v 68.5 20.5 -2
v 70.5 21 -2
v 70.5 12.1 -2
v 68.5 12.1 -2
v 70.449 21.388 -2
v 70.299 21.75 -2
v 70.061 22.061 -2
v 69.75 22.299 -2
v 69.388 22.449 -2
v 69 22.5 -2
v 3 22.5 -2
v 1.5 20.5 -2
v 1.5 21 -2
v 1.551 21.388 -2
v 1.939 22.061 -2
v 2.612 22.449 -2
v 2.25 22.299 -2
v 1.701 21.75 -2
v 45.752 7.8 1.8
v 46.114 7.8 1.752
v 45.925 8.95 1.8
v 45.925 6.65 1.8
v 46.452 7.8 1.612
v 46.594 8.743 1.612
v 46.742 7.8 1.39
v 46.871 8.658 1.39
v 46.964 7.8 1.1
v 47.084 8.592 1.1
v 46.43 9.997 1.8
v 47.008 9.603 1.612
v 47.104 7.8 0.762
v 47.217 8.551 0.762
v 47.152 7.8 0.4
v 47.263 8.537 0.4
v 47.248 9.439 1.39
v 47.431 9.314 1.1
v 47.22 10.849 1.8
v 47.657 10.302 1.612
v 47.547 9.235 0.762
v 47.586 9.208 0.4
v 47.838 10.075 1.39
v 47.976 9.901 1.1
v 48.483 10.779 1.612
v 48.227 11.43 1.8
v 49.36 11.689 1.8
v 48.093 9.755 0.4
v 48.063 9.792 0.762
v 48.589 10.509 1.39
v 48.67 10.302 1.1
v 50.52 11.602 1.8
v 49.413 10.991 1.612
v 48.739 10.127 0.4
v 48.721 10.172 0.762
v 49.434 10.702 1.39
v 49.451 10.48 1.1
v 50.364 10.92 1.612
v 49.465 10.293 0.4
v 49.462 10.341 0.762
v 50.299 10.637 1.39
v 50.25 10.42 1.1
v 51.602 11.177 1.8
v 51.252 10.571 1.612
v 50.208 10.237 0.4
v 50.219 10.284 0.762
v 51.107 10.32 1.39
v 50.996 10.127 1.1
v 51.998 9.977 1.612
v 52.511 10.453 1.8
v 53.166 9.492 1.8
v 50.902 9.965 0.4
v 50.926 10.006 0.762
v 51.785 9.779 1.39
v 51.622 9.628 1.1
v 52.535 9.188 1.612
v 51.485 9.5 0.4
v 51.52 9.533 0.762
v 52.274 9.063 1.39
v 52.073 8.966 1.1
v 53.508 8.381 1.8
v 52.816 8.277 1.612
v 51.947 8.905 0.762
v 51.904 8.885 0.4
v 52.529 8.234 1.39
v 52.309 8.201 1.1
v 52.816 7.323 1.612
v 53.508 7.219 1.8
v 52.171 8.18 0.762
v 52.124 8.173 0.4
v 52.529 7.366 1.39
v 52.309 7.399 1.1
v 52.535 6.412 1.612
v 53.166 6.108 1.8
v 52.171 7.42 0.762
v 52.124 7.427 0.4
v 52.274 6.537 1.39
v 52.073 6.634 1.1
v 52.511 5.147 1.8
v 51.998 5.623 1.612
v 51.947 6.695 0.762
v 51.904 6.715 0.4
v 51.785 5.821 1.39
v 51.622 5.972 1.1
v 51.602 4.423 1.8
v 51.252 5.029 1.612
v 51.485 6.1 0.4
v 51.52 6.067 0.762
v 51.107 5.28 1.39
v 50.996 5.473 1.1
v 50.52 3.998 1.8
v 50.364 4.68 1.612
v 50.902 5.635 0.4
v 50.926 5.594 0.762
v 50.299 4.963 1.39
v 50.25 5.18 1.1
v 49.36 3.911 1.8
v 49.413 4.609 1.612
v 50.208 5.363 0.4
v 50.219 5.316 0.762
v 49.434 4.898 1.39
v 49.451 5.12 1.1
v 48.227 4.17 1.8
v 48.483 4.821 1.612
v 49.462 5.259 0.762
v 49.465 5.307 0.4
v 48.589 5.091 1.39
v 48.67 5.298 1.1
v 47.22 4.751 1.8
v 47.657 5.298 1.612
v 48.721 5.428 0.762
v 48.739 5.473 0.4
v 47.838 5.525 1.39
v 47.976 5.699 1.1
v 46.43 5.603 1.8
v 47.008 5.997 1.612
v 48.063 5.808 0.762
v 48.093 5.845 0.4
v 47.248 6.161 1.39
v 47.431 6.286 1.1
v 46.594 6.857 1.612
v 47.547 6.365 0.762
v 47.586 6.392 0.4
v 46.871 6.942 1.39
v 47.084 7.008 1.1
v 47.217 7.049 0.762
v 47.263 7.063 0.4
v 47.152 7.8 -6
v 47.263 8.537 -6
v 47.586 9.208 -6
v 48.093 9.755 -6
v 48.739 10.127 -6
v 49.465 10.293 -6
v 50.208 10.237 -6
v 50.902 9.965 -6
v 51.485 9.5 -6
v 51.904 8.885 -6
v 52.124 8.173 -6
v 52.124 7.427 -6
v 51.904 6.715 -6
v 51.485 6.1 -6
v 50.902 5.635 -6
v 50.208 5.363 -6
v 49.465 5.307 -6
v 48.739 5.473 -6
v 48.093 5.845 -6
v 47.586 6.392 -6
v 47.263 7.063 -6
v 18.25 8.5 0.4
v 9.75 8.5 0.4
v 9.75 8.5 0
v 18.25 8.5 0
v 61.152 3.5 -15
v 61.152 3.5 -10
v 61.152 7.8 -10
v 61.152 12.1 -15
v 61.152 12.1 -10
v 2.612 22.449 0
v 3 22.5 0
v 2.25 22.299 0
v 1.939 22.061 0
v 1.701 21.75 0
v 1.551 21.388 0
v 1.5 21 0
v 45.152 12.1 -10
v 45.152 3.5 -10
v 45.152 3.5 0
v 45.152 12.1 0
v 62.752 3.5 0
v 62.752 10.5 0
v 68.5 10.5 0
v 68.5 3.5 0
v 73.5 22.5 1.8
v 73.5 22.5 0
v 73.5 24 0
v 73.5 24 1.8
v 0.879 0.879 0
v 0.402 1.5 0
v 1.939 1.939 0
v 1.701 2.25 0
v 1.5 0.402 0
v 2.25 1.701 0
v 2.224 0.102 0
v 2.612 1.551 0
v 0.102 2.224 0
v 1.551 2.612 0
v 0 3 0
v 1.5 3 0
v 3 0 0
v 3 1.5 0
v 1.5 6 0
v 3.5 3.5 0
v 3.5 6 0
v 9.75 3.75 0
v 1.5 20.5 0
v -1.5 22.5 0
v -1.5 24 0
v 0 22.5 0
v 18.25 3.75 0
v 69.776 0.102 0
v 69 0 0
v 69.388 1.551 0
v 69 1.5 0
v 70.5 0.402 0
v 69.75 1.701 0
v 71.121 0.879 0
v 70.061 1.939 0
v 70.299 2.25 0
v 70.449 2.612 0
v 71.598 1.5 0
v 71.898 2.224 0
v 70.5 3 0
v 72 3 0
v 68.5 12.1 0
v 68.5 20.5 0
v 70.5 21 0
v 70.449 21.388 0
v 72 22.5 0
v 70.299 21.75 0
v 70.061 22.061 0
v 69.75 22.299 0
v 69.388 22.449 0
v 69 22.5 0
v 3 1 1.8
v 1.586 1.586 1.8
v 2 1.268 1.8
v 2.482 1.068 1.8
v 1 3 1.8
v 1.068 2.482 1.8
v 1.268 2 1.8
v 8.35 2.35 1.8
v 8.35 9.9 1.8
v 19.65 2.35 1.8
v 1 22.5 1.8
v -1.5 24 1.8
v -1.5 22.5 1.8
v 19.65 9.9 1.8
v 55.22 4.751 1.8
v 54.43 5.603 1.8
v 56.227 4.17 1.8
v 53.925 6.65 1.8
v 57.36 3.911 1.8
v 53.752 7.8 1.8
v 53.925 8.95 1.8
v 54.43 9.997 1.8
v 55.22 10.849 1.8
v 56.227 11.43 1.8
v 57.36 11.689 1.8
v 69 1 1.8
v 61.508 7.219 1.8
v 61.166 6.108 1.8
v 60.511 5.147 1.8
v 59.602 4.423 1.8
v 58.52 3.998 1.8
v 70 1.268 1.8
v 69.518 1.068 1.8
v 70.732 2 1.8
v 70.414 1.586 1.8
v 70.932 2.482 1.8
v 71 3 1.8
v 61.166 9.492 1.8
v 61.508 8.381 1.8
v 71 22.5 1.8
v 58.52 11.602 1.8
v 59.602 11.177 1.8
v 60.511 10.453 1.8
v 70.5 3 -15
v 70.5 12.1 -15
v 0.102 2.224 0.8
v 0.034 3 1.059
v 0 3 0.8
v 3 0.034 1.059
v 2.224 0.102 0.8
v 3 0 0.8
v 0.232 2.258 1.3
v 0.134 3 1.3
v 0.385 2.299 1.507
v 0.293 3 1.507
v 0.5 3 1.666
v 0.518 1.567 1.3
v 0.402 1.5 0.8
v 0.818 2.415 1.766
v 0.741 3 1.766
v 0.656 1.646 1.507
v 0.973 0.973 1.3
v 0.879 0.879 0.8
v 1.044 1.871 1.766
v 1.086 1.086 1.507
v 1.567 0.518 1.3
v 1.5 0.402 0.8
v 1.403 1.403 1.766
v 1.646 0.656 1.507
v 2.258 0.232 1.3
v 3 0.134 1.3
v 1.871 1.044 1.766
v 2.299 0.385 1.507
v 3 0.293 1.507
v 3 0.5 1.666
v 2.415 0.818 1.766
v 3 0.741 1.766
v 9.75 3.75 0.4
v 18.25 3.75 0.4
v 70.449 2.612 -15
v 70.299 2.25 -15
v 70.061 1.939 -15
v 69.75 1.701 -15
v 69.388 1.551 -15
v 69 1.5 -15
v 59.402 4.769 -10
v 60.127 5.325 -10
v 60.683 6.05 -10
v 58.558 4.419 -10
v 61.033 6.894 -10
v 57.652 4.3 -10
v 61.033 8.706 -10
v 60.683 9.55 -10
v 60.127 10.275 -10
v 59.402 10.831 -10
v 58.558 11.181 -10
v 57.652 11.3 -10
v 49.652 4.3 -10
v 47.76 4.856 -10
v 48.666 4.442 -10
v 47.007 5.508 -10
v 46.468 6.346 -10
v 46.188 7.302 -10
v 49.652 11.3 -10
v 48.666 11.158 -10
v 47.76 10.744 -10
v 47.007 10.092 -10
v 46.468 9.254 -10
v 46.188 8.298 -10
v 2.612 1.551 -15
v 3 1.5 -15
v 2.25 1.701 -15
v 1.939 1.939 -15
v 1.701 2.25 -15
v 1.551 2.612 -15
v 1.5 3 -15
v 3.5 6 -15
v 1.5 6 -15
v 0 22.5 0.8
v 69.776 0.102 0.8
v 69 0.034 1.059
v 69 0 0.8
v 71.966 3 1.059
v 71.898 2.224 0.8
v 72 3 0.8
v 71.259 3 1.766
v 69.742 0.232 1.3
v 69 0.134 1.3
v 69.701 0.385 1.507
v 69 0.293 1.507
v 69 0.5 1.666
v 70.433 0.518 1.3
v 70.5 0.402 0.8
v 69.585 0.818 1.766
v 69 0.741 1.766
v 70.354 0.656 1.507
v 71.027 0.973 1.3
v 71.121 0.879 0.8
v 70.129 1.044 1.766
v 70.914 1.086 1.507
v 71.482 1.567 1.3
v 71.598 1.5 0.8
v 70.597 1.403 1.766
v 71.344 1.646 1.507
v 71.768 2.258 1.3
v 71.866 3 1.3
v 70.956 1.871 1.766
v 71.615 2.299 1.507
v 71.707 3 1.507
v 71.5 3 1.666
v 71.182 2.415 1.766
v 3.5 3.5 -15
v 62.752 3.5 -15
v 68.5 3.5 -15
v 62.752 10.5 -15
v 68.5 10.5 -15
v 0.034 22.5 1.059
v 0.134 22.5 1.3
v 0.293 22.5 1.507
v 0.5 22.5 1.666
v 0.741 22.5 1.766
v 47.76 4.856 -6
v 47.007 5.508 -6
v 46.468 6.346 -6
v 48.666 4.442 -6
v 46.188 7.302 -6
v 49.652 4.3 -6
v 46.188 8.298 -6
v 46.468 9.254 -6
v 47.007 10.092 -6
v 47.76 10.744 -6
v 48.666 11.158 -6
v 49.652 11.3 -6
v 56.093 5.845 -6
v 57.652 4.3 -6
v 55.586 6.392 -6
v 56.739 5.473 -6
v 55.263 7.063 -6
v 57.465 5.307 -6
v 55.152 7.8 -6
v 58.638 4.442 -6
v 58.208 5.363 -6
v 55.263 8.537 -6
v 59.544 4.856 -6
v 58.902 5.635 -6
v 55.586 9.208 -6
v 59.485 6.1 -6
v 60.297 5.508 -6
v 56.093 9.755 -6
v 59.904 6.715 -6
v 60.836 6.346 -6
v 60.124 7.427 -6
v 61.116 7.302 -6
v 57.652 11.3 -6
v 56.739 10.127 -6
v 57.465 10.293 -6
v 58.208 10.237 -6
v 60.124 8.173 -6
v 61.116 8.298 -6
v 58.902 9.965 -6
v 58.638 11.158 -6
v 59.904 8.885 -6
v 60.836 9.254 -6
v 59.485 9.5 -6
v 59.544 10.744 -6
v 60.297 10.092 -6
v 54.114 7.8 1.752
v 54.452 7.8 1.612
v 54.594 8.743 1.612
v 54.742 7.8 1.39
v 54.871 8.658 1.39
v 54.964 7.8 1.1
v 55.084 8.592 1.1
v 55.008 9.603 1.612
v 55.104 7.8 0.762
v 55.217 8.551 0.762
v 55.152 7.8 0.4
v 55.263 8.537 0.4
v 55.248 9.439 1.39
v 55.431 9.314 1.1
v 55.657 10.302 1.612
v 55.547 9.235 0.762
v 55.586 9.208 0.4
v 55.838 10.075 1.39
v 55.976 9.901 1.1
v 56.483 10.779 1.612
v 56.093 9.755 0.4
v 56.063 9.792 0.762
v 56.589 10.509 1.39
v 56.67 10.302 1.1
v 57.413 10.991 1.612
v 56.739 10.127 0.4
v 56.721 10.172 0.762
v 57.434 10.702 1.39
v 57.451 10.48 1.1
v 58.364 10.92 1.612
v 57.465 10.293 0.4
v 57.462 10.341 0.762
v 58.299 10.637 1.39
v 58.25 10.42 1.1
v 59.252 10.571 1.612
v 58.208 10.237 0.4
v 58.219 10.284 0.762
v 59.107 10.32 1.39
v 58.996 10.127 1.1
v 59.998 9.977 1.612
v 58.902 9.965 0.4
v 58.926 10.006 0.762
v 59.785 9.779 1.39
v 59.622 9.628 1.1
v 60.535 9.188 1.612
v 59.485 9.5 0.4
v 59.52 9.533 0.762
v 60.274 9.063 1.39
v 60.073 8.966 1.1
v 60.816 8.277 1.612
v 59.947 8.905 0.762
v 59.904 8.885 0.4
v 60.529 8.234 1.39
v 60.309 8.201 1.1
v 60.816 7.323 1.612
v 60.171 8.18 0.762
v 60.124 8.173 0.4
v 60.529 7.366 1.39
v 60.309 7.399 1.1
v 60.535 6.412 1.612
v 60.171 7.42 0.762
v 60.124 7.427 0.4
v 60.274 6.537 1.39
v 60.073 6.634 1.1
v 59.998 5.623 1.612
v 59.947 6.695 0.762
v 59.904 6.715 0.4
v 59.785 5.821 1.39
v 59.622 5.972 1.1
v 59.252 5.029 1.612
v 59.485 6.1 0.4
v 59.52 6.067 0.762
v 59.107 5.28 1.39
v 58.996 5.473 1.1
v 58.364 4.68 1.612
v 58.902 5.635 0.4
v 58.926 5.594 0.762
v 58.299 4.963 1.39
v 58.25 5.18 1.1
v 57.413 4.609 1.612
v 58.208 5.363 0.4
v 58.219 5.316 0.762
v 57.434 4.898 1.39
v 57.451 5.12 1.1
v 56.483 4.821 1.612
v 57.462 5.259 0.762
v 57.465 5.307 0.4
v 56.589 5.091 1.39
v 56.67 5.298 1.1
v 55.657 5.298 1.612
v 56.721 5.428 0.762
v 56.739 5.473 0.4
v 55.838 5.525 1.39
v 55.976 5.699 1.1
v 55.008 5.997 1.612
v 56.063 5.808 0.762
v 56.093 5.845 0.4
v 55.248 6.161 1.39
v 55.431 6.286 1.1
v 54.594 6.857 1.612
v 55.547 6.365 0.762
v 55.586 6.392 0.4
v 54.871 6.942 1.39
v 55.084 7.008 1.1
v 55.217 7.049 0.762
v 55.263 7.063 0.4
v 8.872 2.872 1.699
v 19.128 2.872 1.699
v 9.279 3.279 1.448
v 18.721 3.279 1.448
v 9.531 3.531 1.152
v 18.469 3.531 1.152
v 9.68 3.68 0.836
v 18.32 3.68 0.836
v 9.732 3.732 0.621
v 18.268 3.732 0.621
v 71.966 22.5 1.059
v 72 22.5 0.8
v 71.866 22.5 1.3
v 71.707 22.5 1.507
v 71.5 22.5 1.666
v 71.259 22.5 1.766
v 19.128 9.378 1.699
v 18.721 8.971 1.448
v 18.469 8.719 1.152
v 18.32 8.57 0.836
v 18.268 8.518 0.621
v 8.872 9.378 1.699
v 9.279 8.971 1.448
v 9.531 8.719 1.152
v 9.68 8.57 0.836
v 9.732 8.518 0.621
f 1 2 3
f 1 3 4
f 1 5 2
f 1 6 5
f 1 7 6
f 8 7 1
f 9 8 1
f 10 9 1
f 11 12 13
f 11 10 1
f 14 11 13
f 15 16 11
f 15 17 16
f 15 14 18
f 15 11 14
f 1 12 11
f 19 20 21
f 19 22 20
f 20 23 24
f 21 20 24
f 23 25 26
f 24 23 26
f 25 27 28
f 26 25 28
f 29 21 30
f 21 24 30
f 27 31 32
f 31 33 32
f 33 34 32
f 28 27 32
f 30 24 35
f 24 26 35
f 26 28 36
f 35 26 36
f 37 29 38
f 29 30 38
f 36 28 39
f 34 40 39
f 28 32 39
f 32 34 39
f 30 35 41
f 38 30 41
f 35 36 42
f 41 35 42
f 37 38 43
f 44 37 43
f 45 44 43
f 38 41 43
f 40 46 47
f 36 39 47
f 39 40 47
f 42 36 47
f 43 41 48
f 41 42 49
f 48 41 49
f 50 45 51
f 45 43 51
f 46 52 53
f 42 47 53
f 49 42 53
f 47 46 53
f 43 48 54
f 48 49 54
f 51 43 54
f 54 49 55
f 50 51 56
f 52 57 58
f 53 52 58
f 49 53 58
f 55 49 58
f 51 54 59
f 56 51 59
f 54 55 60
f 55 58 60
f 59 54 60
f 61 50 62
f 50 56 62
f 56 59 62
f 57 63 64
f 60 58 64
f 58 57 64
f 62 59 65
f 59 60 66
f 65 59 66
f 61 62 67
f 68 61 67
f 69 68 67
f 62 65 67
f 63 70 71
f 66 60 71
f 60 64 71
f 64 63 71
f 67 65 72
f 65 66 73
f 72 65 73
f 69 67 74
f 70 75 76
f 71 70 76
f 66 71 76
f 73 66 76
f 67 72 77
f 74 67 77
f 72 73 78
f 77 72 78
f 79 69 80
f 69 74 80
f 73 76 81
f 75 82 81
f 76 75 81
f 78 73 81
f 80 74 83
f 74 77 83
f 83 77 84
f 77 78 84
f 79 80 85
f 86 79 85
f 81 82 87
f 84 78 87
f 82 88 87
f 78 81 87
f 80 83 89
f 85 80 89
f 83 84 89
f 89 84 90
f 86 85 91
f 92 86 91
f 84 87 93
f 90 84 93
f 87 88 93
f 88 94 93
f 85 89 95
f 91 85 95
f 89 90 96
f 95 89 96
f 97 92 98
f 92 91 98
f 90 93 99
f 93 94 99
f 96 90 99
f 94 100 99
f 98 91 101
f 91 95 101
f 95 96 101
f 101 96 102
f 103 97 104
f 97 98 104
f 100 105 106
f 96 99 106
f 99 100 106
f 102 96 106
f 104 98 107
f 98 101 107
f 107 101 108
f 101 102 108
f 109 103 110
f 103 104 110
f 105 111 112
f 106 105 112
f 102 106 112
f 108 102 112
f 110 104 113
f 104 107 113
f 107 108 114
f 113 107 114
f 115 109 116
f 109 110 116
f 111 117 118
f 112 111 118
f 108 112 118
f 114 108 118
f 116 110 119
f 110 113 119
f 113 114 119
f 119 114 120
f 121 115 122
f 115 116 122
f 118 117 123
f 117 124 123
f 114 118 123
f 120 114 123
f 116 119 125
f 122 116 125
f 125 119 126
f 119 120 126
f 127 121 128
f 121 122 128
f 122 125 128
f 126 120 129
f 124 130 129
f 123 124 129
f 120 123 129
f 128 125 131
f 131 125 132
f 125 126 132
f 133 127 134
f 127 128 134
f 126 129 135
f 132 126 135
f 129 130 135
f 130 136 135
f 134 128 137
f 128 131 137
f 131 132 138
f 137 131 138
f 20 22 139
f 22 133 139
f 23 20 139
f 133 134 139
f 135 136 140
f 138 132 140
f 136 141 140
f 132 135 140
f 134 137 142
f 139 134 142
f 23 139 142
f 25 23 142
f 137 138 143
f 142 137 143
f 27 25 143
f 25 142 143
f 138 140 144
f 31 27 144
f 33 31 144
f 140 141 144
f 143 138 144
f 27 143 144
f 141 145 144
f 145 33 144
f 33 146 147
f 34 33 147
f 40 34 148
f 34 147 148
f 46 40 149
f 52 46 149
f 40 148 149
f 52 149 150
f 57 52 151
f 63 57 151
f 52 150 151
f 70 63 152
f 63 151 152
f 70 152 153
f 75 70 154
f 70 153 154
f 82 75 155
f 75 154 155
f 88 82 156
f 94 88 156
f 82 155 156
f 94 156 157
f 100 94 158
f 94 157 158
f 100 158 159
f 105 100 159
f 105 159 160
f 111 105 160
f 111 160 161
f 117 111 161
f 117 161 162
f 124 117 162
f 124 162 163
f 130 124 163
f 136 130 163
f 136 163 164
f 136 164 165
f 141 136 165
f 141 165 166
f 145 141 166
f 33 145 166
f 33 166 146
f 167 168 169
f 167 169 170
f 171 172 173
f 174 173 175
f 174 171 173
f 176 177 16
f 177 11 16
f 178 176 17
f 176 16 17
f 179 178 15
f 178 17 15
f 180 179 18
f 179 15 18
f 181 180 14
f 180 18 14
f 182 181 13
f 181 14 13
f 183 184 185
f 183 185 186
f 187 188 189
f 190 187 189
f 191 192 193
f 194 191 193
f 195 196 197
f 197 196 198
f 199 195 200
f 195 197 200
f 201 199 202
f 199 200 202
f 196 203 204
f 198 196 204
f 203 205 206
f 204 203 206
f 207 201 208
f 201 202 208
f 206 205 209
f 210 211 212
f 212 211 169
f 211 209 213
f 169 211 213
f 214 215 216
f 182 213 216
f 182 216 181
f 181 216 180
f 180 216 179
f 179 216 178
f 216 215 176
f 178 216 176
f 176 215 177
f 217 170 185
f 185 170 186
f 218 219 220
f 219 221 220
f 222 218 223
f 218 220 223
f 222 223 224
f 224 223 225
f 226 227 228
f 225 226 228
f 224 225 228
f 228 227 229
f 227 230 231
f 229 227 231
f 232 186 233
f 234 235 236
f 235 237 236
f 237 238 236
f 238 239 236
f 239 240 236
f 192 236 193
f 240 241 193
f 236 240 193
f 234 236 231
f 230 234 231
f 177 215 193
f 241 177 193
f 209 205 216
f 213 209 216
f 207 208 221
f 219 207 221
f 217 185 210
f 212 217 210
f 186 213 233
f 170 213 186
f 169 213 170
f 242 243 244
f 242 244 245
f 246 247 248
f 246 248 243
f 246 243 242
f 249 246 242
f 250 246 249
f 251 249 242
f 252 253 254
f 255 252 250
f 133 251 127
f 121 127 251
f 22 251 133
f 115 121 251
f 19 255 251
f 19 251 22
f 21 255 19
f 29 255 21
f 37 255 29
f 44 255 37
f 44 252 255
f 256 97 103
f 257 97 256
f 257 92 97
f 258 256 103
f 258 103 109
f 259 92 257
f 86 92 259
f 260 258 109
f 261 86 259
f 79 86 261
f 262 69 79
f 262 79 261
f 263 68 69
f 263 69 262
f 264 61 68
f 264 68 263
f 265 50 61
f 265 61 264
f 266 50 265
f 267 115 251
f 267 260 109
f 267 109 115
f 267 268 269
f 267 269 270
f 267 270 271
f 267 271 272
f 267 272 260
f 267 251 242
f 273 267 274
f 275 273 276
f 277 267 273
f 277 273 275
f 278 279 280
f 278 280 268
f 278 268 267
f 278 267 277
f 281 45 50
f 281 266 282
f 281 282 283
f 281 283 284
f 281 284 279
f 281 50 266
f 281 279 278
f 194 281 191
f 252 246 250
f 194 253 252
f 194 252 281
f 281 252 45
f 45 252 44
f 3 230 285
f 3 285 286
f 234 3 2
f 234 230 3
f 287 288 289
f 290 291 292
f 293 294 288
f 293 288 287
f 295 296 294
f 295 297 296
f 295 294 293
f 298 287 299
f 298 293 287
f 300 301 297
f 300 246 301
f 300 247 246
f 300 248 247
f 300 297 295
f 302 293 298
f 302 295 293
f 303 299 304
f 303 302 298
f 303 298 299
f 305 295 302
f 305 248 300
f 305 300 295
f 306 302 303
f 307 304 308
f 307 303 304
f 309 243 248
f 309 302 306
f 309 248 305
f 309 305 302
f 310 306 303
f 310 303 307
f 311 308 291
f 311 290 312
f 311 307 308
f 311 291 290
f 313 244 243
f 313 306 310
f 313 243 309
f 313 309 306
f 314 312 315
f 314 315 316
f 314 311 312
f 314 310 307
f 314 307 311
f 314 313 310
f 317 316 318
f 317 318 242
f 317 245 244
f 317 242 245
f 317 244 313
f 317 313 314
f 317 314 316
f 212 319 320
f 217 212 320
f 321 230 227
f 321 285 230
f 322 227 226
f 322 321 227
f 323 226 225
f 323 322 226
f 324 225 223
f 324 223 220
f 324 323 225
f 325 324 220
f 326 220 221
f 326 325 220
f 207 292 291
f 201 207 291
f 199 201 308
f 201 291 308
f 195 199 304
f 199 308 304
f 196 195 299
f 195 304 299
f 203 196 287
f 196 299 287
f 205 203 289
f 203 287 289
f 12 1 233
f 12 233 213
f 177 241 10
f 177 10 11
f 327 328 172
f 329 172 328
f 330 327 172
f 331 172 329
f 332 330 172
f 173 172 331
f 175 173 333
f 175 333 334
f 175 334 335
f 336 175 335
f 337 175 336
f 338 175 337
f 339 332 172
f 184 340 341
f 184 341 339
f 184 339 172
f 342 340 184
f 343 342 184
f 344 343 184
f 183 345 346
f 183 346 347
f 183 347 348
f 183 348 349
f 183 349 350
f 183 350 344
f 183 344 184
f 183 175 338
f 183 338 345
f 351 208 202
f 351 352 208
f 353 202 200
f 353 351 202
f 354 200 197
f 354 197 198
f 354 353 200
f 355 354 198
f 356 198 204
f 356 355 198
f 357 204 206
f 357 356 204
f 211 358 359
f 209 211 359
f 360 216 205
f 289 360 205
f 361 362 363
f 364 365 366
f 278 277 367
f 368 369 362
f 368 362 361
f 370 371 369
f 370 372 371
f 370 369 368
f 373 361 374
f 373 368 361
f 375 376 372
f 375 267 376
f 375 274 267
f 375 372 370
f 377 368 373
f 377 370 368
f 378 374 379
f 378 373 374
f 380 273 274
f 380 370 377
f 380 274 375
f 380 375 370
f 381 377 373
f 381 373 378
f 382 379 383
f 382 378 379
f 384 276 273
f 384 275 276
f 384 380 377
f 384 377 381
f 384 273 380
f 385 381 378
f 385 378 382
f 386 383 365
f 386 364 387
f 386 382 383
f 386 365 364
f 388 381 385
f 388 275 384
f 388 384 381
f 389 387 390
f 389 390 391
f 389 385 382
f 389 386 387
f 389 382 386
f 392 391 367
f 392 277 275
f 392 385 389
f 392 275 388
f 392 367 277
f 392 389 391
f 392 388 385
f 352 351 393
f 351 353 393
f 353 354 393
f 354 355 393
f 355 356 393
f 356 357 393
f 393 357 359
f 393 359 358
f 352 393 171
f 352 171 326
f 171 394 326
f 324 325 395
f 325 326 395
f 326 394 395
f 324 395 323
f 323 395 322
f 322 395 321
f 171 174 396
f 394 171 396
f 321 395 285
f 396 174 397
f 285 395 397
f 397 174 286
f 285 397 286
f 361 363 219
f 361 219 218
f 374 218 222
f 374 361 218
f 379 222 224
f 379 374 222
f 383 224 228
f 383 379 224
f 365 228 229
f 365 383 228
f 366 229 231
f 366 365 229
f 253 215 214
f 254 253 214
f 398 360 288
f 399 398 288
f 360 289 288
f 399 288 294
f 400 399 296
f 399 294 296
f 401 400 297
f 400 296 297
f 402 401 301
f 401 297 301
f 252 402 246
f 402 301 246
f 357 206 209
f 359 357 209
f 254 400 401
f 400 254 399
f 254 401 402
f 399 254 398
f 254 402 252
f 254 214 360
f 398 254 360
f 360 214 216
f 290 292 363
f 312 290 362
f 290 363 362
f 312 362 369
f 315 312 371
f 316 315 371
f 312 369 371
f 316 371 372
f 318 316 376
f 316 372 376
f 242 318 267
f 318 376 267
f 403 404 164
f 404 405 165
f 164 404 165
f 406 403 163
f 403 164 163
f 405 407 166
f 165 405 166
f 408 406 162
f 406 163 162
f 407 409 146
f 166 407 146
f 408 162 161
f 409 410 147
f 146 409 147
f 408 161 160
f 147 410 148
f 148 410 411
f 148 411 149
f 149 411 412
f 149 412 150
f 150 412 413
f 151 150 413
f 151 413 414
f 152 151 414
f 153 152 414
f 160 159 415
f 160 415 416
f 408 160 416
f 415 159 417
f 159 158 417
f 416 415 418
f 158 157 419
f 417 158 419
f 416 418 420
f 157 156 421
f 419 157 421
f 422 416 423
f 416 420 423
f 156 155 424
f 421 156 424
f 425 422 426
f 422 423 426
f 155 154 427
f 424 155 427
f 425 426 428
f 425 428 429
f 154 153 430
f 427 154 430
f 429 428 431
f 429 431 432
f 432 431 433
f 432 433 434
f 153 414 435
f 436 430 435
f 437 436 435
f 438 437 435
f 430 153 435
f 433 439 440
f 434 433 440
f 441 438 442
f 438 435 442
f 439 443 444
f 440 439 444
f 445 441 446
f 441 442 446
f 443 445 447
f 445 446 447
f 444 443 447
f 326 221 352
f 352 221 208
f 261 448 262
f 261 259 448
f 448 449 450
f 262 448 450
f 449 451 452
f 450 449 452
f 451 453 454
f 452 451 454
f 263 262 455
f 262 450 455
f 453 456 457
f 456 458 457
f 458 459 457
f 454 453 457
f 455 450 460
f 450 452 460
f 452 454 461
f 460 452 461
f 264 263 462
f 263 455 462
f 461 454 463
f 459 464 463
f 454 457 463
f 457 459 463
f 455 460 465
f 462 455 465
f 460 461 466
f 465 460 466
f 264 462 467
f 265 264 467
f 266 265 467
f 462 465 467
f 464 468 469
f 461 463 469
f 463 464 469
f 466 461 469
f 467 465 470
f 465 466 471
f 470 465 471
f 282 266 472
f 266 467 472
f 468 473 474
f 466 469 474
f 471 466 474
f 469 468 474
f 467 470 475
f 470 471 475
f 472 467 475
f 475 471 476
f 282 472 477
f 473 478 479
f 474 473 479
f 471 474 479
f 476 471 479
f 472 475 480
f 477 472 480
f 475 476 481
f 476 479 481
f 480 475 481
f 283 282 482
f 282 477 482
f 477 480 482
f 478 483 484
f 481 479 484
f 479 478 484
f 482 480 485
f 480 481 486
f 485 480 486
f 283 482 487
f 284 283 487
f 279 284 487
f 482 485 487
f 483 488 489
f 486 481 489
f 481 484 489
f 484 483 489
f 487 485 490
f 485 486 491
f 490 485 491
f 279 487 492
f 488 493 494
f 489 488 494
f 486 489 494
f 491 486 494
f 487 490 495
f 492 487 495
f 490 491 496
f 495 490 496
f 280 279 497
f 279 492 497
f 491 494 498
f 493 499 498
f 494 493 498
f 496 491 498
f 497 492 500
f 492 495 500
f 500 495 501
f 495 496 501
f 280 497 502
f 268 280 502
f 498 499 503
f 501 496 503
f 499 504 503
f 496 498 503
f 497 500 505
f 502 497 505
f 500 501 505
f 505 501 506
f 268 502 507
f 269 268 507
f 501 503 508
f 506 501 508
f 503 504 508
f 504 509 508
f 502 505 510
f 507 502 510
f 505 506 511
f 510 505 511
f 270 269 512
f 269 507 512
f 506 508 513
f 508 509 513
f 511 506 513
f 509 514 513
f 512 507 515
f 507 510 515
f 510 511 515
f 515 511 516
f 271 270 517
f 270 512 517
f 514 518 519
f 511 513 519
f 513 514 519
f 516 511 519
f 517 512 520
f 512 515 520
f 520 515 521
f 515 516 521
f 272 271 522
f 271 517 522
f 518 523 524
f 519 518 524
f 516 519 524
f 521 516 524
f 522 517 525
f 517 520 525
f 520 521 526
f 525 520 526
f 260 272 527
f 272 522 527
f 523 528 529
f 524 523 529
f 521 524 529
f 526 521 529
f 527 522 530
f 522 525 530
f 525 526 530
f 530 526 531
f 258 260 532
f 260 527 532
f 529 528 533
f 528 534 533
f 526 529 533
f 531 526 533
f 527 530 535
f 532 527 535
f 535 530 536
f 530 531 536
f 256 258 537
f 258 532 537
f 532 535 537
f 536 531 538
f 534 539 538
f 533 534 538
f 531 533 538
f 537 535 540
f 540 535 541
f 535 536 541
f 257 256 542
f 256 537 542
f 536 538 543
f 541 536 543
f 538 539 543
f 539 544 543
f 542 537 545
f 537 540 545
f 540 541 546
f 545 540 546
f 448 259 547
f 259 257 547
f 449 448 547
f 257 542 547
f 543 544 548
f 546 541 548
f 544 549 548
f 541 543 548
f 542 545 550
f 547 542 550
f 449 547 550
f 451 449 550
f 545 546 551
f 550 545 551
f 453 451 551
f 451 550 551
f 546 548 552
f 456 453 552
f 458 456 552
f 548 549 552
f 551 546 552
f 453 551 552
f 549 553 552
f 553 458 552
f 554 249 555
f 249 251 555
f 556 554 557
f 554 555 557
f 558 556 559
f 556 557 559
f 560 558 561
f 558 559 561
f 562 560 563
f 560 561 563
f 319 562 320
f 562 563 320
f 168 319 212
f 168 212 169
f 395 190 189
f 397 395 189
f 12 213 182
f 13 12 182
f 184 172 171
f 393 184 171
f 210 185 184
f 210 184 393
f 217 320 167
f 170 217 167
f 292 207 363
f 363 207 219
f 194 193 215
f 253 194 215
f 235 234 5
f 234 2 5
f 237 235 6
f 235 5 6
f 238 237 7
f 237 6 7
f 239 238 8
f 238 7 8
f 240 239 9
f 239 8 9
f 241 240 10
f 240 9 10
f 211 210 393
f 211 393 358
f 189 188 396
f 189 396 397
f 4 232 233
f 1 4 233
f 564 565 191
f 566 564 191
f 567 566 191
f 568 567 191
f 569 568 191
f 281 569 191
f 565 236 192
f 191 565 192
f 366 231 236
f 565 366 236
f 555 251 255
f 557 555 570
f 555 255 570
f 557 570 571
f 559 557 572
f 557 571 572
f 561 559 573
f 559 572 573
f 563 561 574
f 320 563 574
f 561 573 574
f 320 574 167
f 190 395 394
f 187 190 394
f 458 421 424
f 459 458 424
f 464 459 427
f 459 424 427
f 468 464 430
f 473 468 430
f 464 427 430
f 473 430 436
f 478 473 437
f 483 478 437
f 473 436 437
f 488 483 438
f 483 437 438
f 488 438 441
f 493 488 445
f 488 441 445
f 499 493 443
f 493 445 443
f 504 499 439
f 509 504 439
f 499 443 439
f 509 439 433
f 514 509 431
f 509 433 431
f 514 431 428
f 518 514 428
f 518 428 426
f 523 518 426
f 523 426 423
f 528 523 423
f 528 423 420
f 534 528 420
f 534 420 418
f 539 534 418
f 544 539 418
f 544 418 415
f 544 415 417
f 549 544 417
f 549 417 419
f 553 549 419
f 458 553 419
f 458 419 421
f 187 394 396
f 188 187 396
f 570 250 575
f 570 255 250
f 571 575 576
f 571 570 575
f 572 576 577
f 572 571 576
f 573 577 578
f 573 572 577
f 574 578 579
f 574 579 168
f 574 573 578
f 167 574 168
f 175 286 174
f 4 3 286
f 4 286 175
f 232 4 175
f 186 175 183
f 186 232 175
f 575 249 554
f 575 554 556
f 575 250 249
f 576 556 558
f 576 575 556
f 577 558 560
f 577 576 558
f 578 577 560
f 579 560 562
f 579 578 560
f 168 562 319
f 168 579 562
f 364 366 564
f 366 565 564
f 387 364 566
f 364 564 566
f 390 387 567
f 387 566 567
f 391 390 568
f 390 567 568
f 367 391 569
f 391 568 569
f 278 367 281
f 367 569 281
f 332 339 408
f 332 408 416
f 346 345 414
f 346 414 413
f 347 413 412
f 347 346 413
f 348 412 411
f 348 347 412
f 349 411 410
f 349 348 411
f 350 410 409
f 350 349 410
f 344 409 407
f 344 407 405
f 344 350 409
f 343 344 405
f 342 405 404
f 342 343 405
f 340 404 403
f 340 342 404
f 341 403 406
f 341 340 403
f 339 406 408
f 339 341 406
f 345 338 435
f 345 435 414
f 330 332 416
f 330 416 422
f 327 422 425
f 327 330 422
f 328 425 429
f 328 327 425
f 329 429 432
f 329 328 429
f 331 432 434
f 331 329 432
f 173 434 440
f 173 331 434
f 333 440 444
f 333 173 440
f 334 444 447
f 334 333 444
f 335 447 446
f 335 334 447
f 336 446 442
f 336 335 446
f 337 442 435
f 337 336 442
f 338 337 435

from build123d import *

# Parameters (mm, degrees)
BOSS_EXTRUDE1_DEPTH = 1.8
SKETCH2_W           = 69
SKETCH2_H           = 21
SKETCH2_W_2         = 65
SKETCH2_H_2         = 17
BOSS_EXTRUDE2_DEPTH = 15
SKETCH3_W           = 2
SKETCH3_H           = 14.5
CUT_EXTRUDE2_DEPTH  = 15
SKETCH4_W           = 69
SKETCH4_H           = 10.4
CUT_EXTRUDE4_DEPTH  = 13
BOSS_EXTRUDE4_DEPTH = 15
SKETCH8_W           = 16
SKETCH8_H           = 8.6
BOSS_EXTRUDE5_DEPTH = 10
SKETCH9_R           = 2.5
CUT_EXTRUDE5_DEPTH  = 12
CUT_EXTRUDE6_DEPTH  = 4
FILLET1_R           = 1.4
SKETCH11_W          = 8.5
SKETCH11_H          = 4.75
CUT_EXTRUDE7_DEPTH  = 4
FILLET2_R           = 1.4
FILLET6_R           = 1.5
FILLET7_R           = 1.5
FILLET8_R           = 3
FILLET9_R           = 1


with BuildPart() as part:
    # Sketch1 → Boss-Extrude1 (new body)
    with BuildSketch(Plane.XY):
        Polygon((0, 0), (72, 0), (72, 22.5), (73.5, 22.5), (73.5, 24), (72, 24), (0, 24), (-1.5, 24), (-1.5, 22.5), (0, 22.5), align=None)
    extrude(amount=BOSS_EXTRUDE1_DEPTH)

    # Sketch2 → Boss-Extrude2 (add)
    with BuildSketch(Plane(origin=(0, 0, 0), x_dir=(-1, 0, 0), z_dir=(0, 0, -1))):
        with Locations((-36, 12)):
            Rectangle(SKETCH2_W, SKETCH2_H)
        with Locations((-36, 12)):
            Rectangle(SKETCH2_W_2, SKETCH2_H_2, mode=Mode.SUBTRACT)
    extrude(amount=BOSS_EXTRUDE2_DEPTH)

    # Sketch3 → Cut-Extrude2 (cut)
    with BuildSketch(Plane(origin=(0, 0, -15), x_dir=(-1, 0, 0), z_dir=(0, 0, -1))):
        with Locations((-2.5, 13.25)):
            Rectangle(SKETCH3_W, SKETCH3_H)
    extrude(amount=-CUT_EXTRUDE2_DEPTH, mode=Mode.SUBTRACT)

    # Sketch4 → Cut-Extrude4 (cut)
    with BuildSketch(Plane(origin=(0, 0, -15), x_dir=(-1, 0, 0), z_dir=(0, 0, -1))):
        with Locations((-36, 17.3)):
            Rectangle(SKETCH4_W, SKETCH4_H)
    extrude(amount=-CUT_EXTRUDE4_DEPTH, mode=Mode.SUBTRACT)

    # Sketch7 → Boss-Extrude4 (add)
    with BuildSketch(Plane(origin=(0, 0, -15), x_dir=(-1, 0, 0), z_dir=(0, 0, -1))):
        Polygon((-68.5, 12.1), (-61.151923341, 12.1), (-61.151923341, 10.5), (-61.151923341, 3.5), (-62.751923341, 3.5), (-62.751923341, 10.5), (-68.5, 10.5), align=None)
    extrude(amount=-BOSS_EXTRUDE4_DEPTH)

    # Sketch8 → Boss-Extrude5 (add)
    with BuildSketch(Plane(origin=(0, 0, 0), x_dir=(-1, 0, 0), z_dir=(0, 0, -1))):
        with Locations((-53.151923341, 7.8)):
            Rectangle(SKETCH8_W, SKETCH8_H)
    extrude(amount=BOSS_EXTRUDE5_DEPTH)

    # Sketch9 → Cut-Extrude5 (cut)
    with BuildSketch(Plane(origin=(0, 0, -10), x_dir=(-1, 0, 0), z_dir=(0, 0, -1))):
        with Locations((-49.651923341, 7.8)):
            Circle(SKETCH9_R)
        with Locations((-57.651923341, 7.8)):
            Circle(SKETCH9_R)
    extrude(amount=-CUT_EXTRUDE5_DEPTH, mode=Mode.SUBTRACT)

    # Sketch10 → Cut-Extrude6 (cut)
    with BuildSketch(Plane(origin=(0, 0, -10), x_dir=(-1, 0, 0), z_dir=(0, 0, -1))):
        with BuildLine():
            Line((-57.651923341, 11.3), (-49.651923341, 11.3))
            ThreePointArc((-49.651923341, 11.3), (-46.151923341, 7.8), (-49.651923341, 4.3))
            Line((-49.651923341, 4.3), (-57.651923341, 4.3))
            ThreePointArc((-57.651923341, 4.3), (-61.151923341, 7.8), (-57.651923341, 11.3))
        make_face()
    extrude(amount=-CUT_EXTRUDE6_DEPTH, mode=Mode.SUBTRACT)

    # Fillet1
    fillet1_edges = [part.edges().sort_by_distance(p)[0] for p in [
        (52.151923341, 7.8, 1.8),
        (60.151923341, 7.8, 1.8),
    ]]
    fillet(fillet1_edges, radius=FILLET1_R)

    # Sketch11 → Cut-Extrude7 (cut)
    with BuildSketch(Plane.XY.offset(1.8)):
        with Locations((14, 6.125)):
            Rectangle(SKETCH11_W, SKETCH11_H)
    extrude(amount=-CUT_EXTRUDE7_DEPTH, mode=Mode.SUBTRACT)

    # Fillet2
    fillet2_edges = [part.edges().sort_by_distance(p)[0] for p in [
        (9.75, 6.125, 1.8),
        (14, 3.75, 1.8),
        (18.25, 6.125, 1.8),
        (14, 8.5, 1.8),
    ]]
    fillet(fillet2_edges, radius=FILLET2_R)

    # Fillet6
    fillet6_edges = [part.edges().sort_by_distance(p)[0] for p in [
        (70.5, 1.5, -7.5),
        (1.5, 1.5, -7.5),
    ]]
    fillet(fillet6_edges, radius=FILLET6_R)

    # Fillet7
    fillet7_edges = [part.edges().sort_by_distance(p)[0] for p in [
        (70.5, 22.5, -1),
        (1.5, 22.5, -1),
    ]]
    fillet(fillet7_edges, radius=FILLET7_R)

    # Fillet8
    fillet8_edges = [part.edges().sort_by_distance(p)[0] for p in [
        (72, 0, 0.9),
        (0, 0, 0.9),
    ]]
    fillet(fillet8_edges, radius=FILLET8_R)

    # Fillet9
    fillet9_edges = [part.edges().sort_by_distance(p)[0] for p in [
        (72, 12.75, 1.8),
        (36, 0, 1.8),
        (0.878679656, 0.878679656, 1.8),
        (71.121320344, 0.878679656, 1.8),
        (0, 12.75, 1.8),
    ]]
    fillet(fillet9_edges, radius=FILLET9_R)


solid = part.part
